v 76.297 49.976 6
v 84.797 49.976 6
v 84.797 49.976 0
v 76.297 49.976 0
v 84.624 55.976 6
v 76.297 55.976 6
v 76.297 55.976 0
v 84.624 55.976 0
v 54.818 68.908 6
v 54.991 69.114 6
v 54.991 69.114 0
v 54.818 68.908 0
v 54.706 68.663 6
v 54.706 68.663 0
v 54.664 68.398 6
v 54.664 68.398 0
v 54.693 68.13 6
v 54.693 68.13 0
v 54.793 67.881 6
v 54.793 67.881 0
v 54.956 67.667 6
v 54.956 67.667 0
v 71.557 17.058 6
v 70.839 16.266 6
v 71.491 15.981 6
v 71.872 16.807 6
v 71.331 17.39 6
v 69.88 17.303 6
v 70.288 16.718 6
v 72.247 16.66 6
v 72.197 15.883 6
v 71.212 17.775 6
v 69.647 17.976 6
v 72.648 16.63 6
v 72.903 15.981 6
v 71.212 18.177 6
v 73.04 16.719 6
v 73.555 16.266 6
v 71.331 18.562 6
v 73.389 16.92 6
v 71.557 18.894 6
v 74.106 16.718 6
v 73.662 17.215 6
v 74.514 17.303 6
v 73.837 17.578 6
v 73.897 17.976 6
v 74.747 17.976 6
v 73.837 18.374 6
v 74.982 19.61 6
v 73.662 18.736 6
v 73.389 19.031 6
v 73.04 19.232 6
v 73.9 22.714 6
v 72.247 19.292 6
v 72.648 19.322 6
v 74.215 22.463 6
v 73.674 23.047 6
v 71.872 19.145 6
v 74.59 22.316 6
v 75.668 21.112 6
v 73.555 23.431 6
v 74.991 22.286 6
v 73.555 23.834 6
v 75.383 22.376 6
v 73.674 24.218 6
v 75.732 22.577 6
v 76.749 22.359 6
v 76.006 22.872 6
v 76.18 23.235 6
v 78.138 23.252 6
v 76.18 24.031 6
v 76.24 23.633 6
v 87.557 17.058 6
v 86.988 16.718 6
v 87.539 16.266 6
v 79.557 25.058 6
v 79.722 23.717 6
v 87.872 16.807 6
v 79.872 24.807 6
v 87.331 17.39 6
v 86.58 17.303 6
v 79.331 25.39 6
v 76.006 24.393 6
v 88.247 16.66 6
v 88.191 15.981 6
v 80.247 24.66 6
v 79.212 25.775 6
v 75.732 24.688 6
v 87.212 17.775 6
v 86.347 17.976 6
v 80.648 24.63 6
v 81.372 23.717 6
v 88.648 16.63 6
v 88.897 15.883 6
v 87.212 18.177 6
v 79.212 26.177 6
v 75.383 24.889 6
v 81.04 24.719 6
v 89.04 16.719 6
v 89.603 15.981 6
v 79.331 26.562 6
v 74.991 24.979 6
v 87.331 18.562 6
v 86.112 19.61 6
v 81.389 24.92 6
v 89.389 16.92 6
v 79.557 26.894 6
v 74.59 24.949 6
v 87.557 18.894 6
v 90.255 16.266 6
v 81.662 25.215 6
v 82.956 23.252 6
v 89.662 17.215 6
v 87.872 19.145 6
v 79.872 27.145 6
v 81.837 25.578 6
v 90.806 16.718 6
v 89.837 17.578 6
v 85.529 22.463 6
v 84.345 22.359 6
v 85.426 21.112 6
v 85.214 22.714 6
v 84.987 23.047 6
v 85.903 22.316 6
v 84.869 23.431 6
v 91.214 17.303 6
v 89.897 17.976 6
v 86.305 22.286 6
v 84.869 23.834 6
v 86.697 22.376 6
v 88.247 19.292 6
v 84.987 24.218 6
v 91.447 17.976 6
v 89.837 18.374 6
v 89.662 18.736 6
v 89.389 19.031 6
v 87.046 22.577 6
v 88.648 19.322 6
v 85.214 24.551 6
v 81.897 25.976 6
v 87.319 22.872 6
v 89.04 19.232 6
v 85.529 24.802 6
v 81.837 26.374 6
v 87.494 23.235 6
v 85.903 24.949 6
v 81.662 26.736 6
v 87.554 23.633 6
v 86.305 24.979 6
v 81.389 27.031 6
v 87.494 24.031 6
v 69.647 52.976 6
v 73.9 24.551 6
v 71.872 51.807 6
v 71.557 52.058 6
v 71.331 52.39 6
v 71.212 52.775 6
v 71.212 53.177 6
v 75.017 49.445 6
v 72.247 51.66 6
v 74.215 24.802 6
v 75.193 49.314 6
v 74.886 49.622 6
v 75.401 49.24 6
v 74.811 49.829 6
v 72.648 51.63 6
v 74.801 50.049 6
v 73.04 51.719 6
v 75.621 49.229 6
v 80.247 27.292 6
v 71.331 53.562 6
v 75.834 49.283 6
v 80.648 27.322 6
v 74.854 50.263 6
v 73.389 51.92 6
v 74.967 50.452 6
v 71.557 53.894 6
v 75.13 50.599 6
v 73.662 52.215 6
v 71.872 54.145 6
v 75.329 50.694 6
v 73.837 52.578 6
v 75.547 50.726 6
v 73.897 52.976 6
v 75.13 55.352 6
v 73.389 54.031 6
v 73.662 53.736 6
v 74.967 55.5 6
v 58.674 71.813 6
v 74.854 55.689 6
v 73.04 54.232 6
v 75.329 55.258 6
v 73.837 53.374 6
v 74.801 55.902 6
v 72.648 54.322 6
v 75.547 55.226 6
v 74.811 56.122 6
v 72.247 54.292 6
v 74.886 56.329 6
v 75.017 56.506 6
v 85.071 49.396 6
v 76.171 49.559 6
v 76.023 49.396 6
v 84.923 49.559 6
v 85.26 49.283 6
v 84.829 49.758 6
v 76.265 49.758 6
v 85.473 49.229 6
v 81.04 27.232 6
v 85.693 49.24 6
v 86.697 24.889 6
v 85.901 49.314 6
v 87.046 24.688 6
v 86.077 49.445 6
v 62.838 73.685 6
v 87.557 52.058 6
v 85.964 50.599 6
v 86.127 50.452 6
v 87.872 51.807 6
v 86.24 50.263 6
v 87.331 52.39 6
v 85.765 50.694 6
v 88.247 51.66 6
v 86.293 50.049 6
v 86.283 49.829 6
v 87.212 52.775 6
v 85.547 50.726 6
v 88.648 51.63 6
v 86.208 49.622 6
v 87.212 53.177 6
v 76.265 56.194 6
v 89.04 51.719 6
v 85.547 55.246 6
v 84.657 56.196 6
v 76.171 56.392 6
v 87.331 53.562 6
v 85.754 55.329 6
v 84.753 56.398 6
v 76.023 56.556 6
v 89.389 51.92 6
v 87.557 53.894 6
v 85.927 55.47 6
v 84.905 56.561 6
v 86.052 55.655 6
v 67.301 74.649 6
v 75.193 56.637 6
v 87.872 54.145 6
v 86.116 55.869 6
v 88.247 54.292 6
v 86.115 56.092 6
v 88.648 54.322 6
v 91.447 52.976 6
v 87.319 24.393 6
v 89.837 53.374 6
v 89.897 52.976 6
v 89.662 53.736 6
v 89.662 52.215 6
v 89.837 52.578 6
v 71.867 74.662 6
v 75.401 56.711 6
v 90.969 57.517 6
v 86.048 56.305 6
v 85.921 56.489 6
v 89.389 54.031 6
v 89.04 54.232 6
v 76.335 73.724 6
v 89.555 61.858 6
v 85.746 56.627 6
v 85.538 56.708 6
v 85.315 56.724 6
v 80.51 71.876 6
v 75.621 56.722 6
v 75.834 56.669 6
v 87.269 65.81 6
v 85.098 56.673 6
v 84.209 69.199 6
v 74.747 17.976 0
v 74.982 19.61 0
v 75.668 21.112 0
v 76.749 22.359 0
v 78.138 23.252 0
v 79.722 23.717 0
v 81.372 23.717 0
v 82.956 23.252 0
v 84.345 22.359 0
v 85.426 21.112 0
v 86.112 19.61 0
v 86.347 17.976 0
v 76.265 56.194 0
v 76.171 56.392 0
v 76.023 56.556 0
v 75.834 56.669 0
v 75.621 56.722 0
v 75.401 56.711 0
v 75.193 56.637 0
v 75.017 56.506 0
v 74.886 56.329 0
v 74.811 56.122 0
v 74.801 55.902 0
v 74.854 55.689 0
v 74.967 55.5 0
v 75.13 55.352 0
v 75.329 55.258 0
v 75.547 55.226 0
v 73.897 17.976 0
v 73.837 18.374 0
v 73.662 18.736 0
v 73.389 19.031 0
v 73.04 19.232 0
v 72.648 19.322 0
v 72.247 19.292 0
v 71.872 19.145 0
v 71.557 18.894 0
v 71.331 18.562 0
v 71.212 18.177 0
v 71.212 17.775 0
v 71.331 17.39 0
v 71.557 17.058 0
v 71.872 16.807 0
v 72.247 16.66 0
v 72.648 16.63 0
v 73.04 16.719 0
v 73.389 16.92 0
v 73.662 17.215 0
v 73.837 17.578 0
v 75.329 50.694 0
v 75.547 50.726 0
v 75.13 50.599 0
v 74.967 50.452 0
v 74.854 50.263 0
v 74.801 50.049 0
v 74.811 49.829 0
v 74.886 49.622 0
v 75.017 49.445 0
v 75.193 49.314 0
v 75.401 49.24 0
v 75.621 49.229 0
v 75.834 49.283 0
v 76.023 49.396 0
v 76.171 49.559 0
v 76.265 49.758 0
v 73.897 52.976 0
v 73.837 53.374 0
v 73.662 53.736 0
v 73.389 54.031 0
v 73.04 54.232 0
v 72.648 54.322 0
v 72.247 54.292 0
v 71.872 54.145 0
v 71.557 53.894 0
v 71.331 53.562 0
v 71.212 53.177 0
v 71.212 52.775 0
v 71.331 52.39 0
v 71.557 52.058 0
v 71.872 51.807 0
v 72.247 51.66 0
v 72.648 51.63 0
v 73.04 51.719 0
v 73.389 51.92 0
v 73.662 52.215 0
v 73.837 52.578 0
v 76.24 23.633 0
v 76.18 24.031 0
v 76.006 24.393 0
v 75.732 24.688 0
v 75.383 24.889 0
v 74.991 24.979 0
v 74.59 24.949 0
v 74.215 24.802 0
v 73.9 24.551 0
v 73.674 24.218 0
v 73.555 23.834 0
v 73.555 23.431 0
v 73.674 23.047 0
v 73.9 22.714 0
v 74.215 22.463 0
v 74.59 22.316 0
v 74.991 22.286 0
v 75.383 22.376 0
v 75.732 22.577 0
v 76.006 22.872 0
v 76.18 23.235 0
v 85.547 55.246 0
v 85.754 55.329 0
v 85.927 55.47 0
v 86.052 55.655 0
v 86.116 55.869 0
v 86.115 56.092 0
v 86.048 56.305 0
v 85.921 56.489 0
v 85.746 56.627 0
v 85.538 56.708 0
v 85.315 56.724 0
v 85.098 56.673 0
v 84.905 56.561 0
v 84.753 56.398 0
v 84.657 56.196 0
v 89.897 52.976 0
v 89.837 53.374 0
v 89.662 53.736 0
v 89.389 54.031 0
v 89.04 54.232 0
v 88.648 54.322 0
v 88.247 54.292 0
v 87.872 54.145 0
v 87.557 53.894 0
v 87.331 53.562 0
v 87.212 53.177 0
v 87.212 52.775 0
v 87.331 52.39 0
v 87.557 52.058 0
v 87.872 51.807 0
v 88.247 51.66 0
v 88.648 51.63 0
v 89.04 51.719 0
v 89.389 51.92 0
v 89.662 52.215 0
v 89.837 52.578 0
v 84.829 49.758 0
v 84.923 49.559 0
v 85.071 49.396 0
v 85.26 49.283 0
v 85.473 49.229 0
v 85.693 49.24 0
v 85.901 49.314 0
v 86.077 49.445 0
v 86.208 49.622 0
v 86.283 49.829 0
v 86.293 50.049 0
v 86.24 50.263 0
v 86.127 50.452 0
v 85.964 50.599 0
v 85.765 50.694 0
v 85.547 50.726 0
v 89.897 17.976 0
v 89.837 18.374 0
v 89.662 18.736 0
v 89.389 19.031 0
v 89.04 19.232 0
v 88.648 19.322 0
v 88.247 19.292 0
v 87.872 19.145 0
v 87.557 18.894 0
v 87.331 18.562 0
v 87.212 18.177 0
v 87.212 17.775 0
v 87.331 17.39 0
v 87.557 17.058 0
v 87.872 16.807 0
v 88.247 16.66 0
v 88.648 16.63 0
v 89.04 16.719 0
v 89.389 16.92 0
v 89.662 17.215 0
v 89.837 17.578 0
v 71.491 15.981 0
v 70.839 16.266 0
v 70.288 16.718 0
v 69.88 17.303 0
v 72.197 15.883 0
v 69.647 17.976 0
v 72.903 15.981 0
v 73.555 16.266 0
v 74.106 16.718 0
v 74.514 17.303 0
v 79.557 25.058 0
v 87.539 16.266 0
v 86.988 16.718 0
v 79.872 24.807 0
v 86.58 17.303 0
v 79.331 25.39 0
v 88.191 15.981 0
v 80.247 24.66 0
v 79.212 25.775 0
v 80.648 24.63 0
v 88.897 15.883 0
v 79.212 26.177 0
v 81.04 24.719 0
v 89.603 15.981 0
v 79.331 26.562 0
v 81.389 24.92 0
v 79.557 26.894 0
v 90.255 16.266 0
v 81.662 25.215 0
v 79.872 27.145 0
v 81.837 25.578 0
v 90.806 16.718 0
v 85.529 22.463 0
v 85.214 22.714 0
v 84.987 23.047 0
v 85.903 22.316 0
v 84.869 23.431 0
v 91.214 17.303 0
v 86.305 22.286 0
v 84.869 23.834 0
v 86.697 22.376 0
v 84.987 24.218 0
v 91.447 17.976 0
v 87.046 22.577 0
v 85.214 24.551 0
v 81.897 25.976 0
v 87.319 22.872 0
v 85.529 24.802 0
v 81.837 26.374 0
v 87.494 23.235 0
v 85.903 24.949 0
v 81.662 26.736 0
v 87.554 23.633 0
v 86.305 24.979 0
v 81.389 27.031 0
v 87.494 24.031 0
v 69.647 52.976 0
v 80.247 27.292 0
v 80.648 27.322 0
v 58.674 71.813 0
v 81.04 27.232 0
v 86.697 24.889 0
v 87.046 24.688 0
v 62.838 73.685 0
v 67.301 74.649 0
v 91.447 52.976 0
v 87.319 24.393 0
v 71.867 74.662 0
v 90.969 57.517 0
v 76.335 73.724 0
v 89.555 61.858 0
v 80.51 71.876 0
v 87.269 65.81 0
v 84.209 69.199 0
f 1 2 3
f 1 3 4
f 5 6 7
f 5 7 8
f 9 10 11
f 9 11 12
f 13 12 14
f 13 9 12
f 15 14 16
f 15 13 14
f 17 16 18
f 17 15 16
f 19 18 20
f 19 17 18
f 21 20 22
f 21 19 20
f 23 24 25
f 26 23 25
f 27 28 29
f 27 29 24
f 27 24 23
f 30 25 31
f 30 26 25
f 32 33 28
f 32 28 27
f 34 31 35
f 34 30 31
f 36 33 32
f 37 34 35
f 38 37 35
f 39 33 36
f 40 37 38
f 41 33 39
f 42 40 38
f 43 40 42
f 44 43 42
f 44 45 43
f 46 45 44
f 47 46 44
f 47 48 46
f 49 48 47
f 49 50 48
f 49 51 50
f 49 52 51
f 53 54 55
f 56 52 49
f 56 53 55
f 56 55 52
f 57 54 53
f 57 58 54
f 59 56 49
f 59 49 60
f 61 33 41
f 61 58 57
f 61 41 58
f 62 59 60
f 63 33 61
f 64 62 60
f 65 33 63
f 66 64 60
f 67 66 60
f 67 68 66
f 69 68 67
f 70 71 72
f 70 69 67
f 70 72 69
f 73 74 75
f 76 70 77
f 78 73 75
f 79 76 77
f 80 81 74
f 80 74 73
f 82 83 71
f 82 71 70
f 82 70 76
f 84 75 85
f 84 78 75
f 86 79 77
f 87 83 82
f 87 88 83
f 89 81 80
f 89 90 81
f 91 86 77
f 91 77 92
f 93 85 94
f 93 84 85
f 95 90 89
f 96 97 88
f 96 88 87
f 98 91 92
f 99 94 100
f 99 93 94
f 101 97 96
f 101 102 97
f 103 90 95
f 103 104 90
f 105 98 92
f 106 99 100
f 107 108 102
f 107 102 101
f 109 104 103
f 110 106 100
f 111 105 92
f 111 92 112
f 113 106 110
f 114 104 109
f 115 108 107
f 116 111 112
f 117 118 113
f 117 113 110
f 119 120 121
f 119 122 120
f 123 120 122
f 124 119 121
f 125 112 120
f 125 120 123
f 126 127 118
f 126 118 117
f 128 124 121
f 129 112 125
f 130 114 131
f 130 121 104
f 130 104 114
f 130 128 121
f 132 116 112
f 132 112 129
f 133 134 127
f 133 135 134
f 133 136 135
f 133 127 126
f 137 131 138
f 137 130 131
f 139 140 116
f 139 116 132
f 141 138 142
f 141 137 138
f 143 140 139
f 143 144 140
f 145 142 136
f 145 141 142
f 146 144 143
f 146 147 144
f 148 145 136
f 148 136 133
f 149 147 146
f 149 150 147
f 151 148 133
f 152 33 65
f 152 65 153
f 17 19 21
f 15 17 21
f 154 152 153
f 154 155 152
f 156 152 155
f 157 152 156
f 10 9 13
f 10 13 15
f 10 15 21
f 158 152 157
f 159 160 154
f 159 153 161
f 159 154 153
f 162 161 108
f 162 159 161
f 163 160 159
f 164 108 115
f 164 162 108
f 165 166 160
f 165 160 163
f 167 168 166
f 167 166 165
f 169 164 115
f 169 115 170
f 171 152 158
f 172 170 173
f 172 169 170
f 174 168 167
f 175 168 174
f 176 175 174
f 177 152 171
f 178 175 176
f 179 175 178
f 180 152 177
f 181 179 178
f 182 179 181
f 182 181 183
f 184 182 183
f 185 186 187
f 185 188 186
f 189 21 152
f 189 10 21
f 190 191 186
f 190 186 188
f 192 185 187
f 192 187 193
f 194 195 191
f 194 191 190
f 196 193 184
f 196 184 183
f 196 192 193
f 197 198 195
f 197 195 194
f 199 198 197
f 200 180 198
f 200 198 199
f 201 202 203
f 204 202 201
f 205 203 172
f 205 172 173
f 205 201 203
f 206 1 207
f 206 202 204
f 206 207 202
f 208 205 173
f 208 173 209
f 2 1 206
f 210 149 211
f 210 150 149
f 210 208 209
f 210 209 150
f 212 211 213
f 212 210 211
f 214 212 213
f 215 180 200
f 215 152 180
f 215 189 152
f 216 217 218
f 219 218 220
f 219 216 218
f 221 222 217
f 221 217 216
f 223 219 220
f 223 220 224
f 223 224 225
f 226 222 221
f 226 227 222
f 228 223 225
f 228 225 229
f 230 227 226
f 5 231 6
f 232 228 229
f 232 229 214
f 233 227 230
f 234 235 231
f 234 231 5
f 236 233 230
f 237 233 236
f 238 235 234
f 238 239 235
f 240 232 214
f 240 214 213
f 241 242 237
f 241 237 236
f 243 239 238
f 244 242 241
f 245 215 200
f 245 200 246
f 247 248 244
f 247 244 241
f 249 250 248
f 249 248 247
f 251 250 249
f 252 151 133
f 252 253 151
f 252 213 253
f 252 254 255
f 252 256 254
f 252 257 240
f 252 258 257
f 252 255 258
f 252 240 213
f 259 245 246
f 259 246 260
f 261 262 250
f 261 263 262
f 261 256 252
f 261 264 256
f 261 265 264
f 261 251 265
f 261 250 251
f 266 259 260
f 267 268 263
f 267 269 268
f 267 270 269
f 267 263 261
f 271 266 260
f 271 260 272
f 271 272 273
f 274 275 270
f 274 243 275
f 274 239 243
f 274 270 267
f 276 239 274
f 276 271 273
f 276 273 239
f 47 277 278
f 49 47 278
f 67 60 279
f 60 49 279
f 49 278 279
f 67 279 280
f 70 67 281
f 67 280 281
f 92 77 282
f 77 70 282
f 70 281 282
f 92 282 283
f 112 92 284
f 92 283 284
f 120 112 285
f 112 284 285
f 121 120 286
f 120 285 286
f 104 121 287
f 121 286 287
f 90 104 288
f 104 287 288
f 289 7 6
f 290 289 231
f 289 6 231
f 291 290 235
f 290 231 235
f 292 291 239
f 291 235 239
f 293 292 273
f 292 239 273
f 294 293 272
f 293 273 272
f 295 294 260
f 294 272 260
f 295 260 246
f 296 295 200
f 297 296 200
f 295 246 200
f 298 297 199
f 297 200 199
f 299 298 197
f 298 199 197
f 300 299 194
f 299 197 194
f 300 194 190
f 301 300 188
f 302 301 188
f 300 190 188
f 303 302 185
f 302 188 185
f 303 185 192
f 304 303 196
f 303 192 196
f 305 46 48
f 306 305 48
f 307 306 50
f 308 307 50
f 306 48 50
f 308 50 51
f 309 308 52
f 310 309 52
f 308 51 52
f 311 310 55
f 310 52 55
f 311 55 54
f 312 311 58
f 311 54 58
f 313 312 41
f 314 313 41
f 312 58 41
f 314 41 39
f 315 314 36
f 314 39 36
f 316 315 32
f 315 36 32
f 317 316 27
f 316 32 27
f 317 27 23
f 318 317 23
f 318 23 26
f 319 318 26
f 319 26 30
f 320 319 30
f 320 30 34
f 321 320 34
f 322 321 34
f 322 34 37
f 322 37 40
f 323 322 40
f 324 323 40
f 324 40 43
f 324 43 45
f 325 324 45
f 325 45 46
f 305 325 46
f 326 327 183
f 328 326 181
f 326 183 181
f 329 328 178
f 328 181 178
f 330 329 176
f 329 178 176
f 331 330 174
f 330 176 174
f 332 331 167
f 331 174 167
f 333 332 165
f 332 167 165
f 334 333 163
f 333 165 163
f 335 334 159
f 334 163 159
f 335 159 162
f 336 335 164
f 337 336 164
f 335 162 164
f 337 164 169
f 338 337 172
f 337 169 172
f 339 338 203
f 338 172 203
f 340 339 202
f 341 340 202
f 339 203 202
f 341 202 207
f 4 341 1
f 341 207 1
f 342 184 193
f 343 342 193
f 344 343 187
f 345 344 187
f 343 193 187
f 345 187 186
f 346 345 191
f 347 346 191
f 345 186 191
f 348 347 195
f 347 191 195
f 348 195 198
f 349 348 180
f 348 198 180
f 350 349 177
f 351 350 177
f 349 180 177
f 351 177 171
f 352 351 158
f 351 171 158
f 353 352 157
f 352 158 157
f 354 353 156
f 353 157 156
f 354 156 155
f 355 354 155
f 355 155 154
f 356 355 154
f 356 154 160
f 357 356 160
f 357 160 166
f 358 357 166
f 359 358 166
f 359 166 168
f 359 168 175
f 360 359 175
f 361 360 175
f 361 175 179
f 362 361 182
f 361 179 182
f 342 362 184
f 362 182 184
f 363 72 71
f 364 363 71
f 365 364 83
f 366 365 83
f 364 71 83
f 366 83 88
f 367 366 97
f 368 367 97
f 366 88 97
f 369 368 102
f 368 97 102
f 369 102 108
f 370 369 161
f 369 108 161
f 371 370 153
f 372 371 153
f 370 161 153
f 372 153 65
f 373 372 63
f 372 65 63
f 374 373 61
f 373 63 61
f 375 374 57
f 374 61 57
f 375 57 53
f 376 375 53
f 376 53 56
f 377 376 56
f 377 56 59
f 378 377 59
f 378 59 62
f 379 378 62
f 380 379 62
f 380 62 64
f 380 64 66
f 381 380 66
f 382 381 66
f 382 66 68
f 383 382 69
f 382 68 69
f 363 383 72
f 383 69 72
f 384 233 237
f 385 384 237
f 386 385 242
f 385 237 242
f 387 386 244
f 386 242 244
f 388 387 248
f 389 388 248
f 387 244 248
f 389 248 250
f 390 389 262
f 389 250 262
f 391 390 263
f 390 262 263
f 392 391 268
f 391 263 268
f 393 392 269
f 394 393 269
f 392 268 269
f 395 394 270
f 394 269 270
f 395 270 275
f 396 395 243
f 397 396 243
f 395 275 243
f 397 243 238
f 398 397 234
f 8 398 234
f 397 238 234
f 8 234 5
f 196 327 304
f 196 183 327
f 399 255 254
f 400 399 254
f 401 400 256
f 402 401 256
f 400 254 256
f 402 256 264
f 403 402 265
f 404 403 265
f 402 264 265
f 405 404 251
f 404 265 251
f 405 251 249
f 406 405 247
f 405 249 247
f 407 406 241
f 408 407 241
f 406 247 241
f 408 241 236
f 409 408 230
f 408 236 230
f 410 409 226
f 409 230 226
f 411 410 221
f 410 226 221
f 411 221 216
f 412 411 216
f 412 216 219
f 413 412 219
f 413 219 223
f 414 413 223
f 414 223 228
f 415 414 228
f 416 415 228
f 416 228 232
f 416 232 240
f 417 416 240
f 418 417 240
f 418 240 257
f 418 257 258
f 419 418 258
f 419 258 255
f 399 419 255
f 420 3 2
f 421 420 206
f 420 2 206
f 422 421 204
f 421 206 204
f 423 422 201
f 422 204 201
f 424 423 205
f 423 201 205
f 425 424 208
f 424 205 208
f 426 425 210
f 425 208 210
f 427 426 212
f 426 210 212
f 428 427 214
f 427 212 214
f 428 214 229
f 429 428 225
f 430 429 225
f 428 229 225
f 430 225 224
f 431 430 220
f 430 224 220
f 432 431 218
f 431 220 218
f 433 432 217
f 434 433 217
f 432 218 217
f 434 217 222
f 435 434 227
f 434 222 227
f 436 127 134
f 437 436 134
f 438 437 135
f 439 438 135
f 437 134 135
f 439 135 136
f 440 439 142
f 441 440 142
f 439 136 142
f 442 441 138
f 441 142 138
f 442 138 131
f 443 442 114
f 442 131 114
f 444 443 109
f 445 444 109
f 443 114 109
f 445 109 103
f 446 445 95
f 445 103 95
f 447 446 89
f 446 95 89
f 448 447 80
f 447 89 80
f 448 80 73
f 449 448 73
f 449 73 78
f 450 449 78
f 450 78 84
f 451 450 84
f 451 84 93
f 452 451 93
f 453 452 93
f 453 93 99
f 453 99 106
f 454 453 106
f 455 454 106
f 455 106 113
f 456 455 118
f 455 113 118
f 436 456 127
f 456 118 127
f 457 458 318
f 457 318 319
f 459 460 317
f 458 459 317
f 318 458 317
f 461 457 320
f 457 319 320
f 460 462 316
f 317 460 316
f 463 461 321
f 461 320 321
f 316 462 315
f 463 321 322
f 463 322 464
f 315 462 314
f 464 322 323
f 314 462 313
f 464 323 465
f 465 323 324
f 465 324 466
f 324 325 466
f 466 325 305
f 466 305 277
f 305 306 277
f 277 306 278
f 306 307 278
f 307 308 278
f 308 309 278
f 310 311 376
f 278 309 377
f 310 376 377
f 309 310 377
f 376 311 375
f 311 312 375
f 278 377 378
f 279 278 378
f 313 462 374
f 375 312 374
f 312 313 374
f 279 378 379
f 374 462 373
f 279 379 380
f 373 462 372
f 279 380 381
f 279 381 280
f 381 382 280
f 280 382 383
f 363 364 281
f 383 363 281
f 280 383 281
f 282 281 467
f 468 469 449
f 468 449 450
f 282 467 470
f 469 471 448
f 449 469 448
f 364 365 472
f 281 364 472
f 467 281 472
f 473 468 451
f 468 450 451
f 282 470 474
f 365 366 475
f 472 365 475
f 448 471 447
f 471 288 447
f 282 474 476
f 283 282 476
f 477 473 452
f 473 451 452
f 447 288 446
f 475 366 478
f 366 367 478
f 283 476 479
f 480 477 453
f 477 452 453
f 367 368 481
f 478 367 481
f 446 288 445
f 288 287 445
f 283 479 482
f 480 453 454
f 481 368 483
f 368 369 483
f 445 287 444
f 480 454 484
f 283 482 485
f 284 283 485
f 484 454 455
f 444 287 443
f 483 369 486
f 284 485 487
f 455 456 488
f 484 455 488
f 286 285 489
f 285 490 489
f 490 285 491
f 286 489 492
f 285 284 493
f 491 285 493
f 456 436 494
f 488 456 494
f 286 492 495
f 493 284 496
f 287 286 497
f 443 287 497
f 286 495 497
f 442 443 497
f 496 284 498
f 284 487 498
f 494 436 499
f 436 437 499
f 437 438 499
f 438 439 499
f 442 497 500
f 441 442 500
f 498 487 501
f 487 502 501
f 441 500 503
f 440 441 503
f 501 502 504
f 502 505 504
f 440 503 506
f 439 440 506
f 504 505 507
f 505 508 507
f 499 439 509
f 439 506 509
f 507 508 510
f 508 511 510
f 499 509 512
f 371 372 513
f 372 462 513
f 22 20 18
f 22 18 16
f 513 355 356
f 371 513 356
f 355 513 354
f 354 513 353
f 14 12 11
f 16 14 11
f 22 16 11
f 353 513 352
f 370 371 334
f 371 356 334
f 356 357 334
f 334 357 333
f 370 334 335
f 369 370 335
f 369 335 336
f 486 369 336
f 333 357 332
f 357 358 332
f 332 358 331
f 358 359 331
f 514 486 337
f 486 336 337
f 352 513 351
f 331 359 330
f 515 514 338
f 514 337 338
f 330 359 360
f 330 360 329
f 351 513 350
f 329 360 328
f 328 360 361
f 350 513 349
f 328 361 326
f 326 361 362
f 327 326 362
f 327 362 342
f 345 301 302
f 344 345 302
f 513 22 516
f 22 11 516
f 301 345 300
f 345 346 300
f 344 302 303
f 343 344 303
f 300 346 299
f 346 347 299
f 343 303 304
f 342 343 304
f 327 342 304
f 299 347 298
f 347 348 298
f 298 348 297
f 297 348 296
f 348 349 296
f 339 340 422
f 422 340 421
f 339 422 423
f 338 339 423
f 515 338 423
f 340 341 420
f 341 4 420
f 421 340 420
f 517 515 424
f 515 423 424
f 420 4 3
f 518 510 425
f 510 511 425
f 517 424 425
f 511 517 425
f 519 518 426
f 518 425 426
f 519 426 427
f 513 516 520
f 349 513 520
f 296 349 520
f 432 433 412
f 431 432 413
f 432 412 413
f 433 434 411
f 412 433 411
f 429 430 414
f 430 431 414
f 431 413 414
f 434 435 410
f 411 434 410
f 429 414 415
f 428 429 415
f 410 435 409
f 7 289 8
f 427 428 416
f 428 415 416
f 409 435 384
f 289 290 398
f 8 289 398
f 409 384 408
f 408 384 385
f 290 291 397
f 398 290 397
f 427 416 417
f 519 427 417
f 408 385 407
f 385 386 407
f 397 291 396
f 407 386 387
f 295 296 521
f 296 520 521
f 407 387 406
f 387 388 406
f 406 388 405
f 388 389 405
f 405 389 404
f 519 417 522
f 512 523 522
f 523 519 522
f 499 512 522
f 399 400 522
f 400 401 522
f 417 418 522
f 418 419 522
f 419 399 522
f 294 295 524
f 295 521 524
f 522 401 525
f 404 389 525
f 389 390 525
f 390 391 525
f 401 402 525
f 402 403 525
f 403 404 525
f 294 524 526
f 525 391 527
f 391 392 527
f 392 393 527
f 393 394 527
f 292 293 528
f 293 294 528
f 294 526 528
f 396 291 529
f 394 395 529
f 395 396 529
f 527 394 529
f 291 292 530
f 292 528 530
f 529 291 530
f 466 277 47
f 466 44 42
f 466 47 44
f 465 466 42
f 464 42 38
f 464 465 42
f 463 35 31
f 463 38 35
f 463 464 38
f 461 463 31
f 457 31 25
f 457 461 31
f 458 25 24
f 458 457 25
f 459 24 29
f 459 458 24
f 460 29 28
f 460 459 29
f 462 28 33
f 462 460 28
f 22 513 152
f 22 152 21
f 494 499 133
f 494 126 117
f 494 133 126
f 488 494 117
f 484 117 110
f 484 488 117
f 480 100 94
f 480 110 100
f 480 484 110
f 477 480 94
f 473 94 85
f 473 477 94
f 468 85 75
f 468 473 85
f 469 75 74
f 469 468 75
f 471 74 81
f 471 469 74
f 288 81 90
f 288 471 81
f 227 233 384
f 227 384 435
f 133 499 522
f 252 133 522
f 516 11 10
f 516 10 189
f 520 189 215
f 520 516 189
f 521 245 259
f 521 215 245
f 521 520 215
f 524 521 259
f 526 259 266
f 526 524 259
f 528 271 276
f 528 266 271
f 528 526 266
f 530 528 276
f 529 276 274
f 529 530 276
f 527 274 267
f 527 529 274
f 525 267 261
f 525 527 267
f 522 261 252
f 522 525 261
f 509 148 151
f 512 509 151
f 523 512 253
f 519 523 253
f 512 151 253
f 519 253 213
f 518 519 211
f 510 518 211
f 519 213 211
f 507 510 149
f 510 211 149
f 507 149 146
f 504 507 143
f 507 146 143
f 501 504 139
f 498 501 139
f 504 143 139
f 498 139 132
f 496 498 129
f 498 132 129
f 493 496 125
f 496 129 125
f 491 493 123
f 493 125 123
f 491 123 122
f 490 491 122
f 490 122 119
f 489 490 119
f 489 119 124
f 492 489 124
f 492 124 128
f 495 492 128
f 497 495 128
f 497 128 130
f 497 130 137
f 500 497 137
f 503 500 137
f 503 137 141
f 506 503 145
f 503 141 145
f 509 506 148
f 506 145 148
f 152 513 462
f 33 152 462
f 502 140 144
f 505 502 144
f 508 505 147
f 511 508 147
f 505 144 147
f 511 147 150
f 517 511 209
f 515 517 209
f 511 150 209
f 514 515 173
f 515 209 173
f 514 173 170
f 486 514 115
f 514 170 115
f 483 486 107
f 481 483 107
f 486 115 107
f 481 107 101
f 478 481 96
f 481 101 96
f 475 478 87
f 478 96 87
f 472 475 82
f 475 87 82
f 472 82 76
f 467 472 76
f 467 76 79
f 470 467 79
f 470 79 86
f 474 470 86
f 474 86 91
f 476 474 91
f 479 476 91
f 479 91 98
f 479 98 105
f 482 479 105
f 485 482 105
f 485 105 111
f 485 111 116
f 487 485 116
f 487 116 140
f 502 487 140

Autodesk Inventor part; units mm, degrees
ref_plane "YZ Plane" through (0, 0, 0) normal (1, 0, 0) x (0, 1, 0)
ref_plane "XZ Plane" through (0, 0, 0) normal (0, 1, 0) x (-1, 0, 0)
ref_plane "XY Plane" through (0, 0, 0) normal (0, 0, 1) x (1, 0, 0)
sketch "스케치1" plane through (0, 0, 0) normal (0, 0, 1) x (1, 0, 0)
  circle A0 centre (88.547, 17.9758) radius 1.2
  circle A1 centre (86.2038, 23.6326) radius 1.2
  circle A2 centre (80.547, 25.9758) radius 1.2
  circle A3 centre (74.8901, 23.6326) radius 1.2
  circle A4 centre (72.547, 17.9758) radius 1.2
  circle A5 centre (80.547, 17.9758) radius 5.8
  arc A6 (69.647, 17.9758) -> (74.747, 17.9758) centre (72.197, 18.4832) ccw
  arc A7 (86.347, 17.9758) -> (91.447, 17.9758) centre (88.897, 18.4832) ccw
  line L0 (69.647, 17.9758) -> (91.447, 17.9758)
  line L1 (91.447, 17.9758) -> (91.447, 37.9758)
  line L2 (91.447, 37.9758) -> (69.647, 37.9758)
  line L3 (69.647, 37.9758) -> (69.647, 17.9758)
  line L4 (69.647, 37.9758) -> (99.4042, 37.9758) construction
  line L5 (69.647, 37.9758) -> (91.447, 37.9758)
  line L6 (91.447, 37.9758) -> (91.447, 52.9758)
  line L7 (91.447, 52.9758) -> (69.647, 52.9758)
  line L8 (69.647, 52.9758) -> (69.647, 37.9758)
  line L9 (69.647, 52.9758) -> (69.647, 52.9758)
  line L10 (91.447, 52.9758) -> (91.447, 52.9758)
  circle A8 centre (69.647, 52.9758) radius 21.8
  line L11 (69.647, 52.9758) -> (54.232, 68.3907)
  point P0 (0, 0)
  point P1 (80.547, 17.9758)
  point P2 (80.547, 17.9758)
  point P3 (69.647, 57.9758)
  point P4 (85.4659, 37.9758)
  point P5 (69.647, 31.1758)
  dimension "d4" = 2.6
  dimension "d5" = 2.6
  dimension "d6" = 20
  dimension "d9" = 15
  dimension "d19" = 0
  dimension "d20" = 0
  dimension "d30" = 135
extrude "돌출1" add sketch "스케치1" along normal blind 6 contours L0 A7 A0 | A0 L0 A5 A4 L3 A8 L2 L1 | L2 A8 L6 | A6 L0 A4 | A8 L3 L2 | L2 L8 L7 A8 | L7 L11 A8
sketch "스케치2" plane through (0, 0, 6) normal (0, 0, 1) x (1, 0, 0)
  arc A0 (69.647, 17.9758) -> (74.747, 17.9758) centre (72.197, 18.4832) ccw projected
  arc A1 (86.347, 17.9758) -> (74.747, 17.9758) centre (80.547, 17.9758) ccw projected
  arc A2 (86.347, 17.9758) -> (91.447, 17.9758) centre (88.897, 18.4832) ccw projected
  circle A3 centre (88.547, 17.9758) radius 1.2 projected
  circle A4 centre (72.547, 17.9758) radius 1.2 projected
  circle A5 centre (80.547, 25.9758) radius 1.2 projected
  circle A6 centre (86.2038, 23.6326) radius 1.2 projected
  circle A7 centre (74.8901, 23.6326) radius 1.2 projected
  circle A8 centre (72.547, 17.9758) radius 1.35
  circle A9 centre (74.8901, 23.6326) radius 1.35
  circle A10 centre (80.547, 25.9758) radius 1.35
  circle A11 centre (86.2038, 23.6326) radius 1.35
  circle A12 centre (88.547, 17.9758) radius 1.35
  arc A13 (91.447, 52.9758) -> (54.232, 68.3907) centre (69.647, 52.9758) ccw projected
  line L0 (69.647, 52.9758) -> (69.647, 17.9758) projected
  line L1 (91.447, 17.9758) -> (91.447, 52.9758) projected
  line L2 (54.232, 68.3907) -> (69.647, 52.9758) projected
  point P0 (0, 0)
  dimension "d12" = 2.7
  dimension "d13" = 2.7
  dimension "d14" = 2.7
  dimension "d15" = 2.7
  dimension "d16" = 2.7
extrude "돌출2" cut sketch "스케치2" against normal blind 6 contours A3 | A4 | A5 | A6 | A7 | A8 | A9 | A10 | A11 | A12
fillet "모깎기1" radius 1 1 edges at (54.232, 68.3907, 3)
sketch "스케치3" plane through (0, 0, 6) normal (0, 0, 1) x (1, 0, 0)
  arc A0 (54.991, 69.114) -> (54.9562, 67.6666) centre (55.6633, 68.3737) ccw projected
  line L0 (54.9562, 67.6666) -> (69.647, 52.9758) projected
  line L1 (69.647, 52.9758) -> (69.647, 17.9758) projected
  arc A1 (69.647, 17.9758) -> (74.747, 17.9758) centre (72.197, 18.4832) ccw projected
  arc A2 (86.347, 17.9758) -> (74.747, 17.9758) centre (80.547, 17.9758) ccw projected
  arc A3 (86.347, 17.9758) -> (91.447, 17.9758) centre (88.897, 18.4832) ccw projected
  line L2 (91.447, 17.9758) -> (91.447, 52.9758) projected
  arc A4 (91.447, 52.9758) -> (54.991, 69.114) centre (69.647, 52.9758) ccw projected
  circle A5 centre (86.2038, 23.6326) radius 1.35 projected
  circle A6 centre (88.547, 17.9758) radius 1.35 projected
  circle A7 centre (80.547, 25.9758) radius 1.35 projected
  circle A8 centre (72.547, 17.9758) radius 1.35 projected
  circle A9 centre (74.8901, 23.6326) radius 1.35 projected
  line L3 (85.547, 49.9758) -> (75.547, 49.9758)
  line L4 (75.547, 49.9758) -> (75.547, 55.9758)
  line L5 (75.547, 55.9758) -> (85.547, 55.9758)
  line L6 (85.547, 55.9758) -> (85.547, 49.9758)
  line L7 (85.547, 49.9758) -> (75.547, 55.9758) construction
  line L8 (75.547, 49.9758) -> (85.547, 55.9758) construction
  point P0 (0, 0)
  point P1 (80.547, 52.9758)
  dimension "d22" = 10
  dimension "d23" = 6
extrude "돌출3" cut sketch "스케치3" against normal blind 6 contours L3 L4 L5 L6
sketch "스케치4" plane through (0, 0, 6) normal (0, 0, 1) x (1, 0, 0)
  line L0 (75.547, 49.9758) -> (75.547, 55.9758) projected
  line L1 (75.547, 55.9758) -> (85.547, 55.9758) projected
  line L2 (85.547, 55.9758) -> (85.547, 49.9758) projected
  line L3 (85.547, 49.9758) -> (75.547, 49.9758) projected
  arc A0 (54.991, 69.114) -> (54.9562, 67.6666) centre (55.6633, 68.3737) ccw projected
  line L4 (54.9562, 67.6666) -> (69.647, 52.9758) projected
  line L5 (69.647, 52.9758) -> (69.647, 17.9758) projected
  arc A1 (69.647, 17.9758) -> (74.747, 17.9758) centre (72.197, 18.4832) ccw projected
  arc A2 (86.347, 17.9758) -> (74.747, 17.9758) centre (80.547, 17.9758) ccw projected
  arc A3 (86.347, 17.9758) -> (91.447, 17.9758) centre (88.897, 18.4832) ccw projected
  line L6 (91.447, 17.9758) -> (91.447, 52.9758) projected
  arc A4 (91.447, 52.9758) -> (54.991, 69.114) centre (69.647, 52.9758) ccw projected
  circle A5 centre (86.2038, 23.6326) radius 1.35 projected
  circle A6 centre (88.547, 17.9758) radius 1.35 projected
  circle A7 centre (80.547, 25.9758) radius 1.35 projected
  circle A8 centre (72.547, 17.9758) radius 1.35 projected
  circle A9 centre (74.8901, 23.6326) radius 1.35 projected
  circle A10 centre (72.547, 52.9758) radius 1.35
  circle A11 centre (88.547, 52.9758) radius 1.35
  point P0 (0, 0)
  point P1 (75.547, 52.9758)
  dimension "d26" = 2.7
  dimension "d27" = 2.7
  dimension "d31" = 3
extrude "돌출4" cut sketch "스케치4" against normal blind 6 contours A10 | A11
sketch "스케치5" plane through (0, 0, 6) normal (0, 0, 1) x (1, 0, 0)
  line L0 (75.547, 55.9758) -> (75.547, 49.9758) projected
  circle A0 centre (75.547, 55.9758) radius 0.75
  circle A1 centre (85.3736, 55.9758) radius 0.75
  line L1 (75.547, 49.9758) -> (85.547, 49.9758) projected
  circle A2 centre (75.547, 49.9758) radius 0.75
  line L2 (85.547, 49.9758) -> (85.547, 55.9758) projected
  circle A3 centre (85.547, 49.9758) radius 0.75
  point P0 (0, 0)
  point P1 (85.547, 50.7258)
  point P2 (84.797, 49.9758)
  dimension "d32" = 1.5
  dimension "d33" = 1.5
  dimension "d34" = 1.5
  dimension "d35" = 1.5
extrude "돌출5" cut sketch "스케치5" against normal blind 10 contours A1 | L1 L2 A3 | A2 L1 L0 | L0 L1 A2 | A0 picked at (85.0543, 49.916)
properties part number "frame_hand1" material "PMMA 플라스틱"
